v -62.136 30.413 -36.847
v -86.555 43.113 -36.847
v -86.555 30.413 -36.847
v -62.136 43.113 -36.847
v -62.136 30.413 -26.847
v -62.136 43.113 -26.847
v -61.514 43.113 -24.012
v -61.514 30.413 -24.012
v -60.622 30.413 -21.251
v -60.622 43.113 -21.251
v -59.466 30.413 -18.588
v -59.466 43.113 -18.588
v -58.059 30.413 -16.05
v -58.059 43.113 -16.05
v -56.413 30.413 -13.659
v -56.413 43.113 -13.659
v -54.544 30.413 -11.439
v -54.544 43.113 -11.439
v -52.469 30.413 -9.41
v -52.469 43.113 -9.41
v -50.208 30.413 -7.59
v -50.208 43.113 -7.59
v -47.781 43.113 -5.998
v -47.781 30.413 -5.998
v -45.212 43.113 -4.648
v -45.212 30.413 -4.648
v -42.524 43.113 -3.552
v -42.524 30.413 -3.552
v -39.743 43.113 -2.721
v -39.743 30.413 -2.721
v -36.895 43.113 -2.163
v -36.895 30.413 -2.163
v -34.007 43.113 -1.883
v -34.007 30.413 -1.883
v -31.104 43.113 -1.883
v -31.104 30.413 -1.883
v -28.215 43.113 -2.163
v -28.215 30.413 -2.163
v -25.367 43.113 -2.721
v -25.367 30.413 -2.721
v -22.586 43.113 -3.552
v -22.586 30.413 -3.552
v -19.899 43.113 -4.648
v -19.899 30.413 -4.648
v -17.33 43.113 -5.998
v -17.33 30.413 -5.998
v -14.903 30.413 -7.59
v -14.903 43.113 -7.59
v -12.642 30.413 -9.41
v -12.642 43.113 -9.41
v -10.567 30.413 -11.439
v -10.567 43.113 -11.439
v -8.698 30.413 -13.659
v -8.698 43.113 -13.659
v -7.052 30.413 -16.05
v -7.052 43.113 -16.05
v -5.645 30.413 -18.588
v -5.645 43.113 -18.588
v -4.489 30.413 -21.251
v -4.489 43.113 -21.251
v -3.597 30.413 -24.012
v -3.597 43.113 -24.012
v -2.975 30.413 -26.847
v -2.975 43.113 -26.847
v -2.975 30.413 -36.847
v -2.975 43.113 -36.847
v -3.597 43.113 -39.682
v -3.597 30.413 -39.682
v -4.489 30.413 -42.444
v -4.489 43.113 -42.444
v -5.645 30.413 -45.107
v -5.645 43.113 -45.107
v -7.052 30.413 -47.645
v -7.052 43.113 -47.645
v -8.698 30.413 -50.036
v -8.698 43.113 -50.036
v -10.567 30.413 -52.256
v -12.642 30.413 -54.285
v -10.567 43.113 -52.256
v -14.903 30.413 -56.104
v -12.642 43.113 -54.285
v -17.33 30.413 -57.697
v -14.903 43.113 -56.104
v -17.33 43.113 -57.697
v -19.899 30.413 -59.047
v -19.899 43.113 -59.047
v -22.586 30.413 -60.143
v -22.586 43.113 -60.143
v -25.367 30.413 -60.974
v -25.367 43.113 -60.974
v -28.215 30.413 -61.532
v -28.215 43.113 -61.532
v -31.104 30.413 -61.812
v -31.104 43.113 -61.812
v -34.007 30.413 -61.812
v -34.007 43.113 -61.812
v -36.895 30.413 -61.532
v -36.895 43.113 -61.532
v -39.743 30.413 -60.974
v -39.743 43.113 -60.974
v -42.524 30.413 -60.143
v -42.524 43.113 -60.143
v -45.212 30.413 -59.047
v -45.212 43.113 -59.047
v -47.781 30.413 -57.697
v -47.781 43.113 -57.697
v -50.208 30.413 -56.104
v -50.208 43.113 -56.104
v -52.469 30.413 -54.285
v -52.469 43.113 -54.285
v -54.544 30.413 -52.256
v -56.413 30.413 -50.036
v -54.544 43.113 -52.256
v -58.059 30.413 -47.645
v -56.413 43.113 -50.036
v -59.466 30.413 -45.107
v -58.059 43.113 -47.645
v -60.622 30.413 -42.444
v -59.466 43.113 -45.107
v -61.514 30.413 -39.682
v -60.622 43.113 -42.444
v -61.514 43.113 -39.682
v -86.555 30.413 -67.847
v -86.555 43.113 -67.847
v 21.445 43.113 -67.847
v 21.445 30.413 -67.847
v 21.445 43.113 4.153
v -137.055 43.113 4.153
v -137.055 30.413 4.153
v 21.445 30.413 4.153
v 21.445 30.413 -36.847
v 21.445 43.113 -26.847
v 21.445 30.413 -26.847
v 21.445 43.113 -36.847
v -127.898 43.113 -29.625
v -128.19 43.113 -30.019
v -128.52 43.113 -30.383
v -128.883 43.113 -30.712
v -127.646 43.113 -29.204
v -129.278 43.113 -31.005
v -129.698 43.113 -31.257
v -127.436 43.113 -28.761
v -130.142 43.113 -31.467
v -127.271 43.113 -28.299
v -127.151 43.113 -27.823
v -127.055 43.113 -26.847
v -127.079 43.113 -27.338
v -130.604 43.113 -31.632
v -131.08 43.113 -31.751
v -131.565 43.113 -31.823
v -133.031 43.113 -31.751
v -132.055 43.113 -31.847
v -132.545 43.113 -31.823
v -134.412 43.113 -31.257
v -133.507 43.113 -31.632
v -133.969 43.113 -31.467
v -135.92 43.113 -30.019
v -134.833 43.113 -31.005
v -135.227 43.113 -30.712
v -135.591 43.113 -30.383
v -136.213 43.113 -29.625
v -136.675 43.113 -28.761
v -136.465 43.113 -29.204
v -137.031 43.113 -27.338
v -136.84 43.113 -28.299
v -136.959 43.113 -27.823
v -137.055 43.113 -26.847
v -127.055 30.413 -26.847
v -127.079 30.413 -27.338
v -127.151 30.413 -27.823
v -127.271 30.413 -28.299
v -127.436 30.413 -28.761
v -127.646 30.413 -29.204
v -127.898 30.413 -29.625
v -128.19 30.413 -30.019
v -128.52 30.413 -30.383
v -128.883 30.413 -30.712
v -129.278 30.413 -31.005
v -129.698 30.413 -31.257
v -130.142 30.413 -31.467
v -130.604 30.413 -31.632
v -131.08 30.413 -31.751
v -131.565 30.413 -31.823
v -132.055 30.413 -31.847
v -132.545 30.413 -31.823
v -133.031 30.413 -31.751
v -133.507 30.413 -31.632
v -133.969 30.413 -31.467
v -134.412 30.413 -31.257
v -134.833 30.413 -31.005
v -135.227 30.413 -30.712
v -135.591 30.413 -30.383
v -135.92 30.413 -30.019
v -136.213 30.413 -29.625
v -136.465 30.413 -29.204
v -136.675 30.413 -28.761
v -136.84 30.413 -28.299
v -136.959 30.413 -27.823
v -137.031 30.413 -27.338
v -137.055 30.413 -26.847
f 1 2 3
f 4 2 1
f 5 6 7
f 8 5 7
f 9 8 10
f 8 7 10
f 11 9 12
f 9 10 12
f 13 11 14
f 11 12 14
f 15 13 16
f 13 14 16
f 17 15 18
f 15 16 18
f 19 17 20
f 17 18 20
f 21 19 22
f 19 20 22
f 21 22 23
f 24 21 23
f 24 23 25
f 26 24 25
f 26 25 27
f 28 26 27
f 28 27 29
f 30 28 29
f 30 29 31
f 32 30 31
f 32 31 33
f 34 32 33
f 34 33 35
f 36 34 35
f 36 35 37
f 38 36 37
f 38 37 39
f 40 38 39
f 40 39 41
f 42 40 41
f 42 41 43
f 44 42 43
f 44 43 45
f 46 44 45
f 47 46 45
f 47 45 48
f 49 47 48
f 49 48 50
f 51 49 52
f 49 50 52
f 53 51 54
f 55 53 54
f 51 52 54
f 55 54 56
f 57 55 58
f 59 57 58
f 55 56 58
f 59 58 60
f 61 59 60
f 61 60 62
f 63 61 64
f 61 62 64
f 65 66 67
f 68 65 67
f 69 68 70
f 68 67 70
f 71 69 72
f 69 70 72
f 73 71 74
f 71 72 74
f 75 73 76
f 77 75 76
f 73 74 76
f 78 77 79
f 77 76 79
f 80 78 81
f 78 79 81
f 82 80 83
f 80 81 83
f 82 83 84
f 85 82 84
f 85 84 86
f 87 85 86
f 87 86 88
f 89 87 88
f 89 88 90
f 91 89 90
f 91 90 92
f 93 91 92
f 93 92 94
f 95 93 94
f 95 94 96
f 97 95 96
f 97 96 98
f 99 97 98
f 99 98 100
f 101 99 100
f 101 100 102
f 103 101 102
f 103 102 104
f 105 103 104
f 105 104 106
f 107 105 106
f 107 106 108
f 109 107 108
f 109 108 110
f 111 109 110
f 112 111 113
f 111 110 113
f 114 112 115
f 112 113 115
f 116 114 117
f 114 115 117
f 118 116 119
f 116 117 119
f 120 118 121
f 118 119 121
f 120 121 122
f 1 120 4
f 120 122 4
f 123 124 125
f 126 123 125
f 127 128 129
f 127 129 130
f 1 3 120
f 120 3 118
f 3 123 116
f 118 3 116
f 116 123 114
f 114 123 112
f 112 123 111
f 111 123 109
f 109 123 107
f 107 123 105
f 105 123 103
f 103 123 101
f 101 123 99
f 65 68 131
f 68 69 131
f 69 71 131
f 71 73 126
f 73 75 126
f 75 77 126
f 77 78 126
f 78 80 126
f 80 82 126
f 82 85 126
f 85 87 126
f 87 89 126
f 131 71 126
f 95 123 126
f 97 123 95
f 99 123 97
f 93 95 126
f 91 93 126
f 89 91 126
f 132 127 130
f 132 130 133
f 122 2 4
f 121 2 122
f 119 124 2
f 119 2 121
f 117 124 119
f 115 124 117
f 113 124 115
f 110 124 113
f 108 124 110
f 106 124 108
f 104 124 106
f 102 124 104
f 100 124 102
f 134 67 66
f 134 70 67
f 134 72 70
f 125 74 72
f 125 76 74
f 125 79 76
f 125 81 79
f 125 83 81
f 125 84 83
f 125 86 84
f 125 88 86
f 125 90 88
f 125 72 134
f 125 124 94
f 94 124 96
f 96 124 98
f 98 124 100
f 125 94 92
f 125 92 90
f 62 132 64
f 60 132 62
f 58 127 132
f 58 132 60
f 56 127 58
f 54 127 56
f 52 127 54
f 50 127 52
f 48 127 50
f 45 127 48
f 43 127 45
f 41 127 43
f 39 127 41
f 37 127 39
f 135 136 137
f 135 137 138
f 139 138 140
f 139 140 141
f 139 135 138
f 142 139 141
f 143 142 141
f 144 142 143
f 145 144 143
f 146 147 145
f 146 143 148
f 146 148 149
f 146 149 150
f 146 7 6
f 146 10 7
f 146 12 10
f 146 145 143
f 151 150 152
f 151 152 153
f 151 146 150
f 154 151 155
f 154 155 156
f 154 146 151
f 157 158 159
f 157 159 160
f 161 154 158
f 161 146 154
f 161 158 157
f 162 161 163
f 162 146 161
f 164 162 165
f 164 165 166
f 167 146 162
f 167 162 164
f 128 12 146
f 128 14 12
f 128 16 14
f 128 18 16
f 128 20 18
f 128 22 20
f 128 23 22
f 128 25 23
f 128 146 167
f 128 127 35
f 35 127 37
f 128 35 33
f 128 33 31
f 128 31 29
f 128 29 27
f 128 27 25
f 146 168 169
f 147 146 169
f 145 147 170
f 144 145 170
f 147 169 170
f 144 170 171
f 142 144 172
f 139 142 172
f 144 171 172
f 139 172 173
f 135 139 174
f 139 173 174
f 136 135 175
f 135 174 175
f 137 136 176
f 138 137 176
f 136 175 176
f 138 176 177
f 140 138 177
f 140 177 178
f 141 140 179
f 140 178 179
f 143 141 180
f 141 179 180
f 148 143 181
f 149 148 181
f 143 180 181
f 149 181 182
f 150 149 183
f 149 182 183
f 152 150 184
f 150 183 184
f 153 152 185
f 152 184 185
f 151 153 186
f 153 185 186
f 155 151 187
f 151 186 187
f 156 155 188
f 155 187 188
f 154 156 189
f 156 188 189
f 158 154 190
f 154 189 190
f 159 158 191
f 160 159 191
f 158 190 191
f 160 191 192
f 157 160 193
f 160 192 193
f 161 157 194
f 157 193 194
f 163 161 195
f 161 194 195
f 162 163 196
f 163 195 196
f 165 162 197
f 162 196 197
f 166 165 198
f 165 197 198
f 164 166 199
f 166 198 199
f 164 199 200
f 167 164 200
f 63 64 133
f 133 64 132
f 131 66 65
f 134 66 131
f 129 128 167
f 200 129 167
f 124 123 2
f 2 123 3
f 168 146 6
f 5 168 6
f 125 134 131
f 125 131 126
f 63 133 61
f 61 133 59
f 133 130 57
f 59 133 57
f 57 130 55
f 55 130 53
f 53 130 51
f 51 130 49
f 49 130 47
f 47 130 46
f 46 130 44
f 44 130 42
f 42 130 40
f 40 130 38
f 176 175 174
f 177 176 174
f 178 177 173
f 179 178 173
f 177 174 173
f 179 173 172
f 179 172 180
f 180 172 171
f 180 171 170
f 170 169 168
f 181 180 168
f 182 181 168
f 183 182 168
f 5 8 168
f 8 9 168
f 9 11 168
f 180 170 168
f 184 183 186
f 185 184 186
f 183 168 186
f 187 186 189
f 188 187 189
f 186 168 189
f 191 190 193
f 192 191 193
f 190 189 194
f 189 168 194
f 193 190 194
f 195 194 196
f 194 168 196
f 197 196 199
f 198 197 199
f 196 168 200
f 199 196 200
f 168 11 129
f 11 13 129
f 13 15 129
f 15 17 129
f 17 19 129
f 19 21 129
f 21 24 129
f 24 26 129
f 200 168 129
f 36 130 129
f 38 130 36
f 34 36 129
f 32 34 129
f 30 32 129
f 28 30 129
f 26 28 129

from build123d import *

# Parameters (mm, degrees)
SKETCH1_W           = 158.5
SKETCH1_H           = 72
BOSS_EXTRUDE1_DEPTH = 12.7
SKETCH2_R           = 30
CUT_EXTRUDE1_DEPTH  = 13.7
SKETCH3_W           = 158.5
SKETCH3_H           = 10
CUT_EXTRUDE3_DEPTH  = 13.7
SKETCH4_W           = 50.5
SKETCH4_H           = 31
CUT_EXTRUDE4_DEPTH  = 13.7
BOSS_EXTRUDE2_DEPTH = 12.7


with BuildPart() as part:
    # Sketch1 → Boss-Extrude1 (new body)
    with BuildSketch(Plane(origin=(0, 43.113273326, 0), x_dir=(1, 0, 0), z_dir=(0, 1, 0))):
        with Locations((-57.805385746, 31.84742784)):
            Rectangle(SKETCH1_W, SKETCH1_H)
    extrude(amount=-BOSS_EXTRUDE1_DEPTH)

    # Sketch2 → Cut-Extrude1 (cut, through all)
    with BuildSketch(Plane(origin=(0, 43.113273326, 0), x_dir=(1, 0, 0), z_dir=(0, 1, 0))):
        with Locations((-32.555385746, 31.84742784)):
            Circle(SKETCH2_R)
    extrude(amount=-CUT_EXTRUDE1_DEPTH, mode=Mode.SUBTRACT)

    # Sketch3 → Cut-Extrude3 (cut, through all)
    with BuildSketch(Plane(origin=(0, 43.113273326, 0), x_dir=(1, 0, 0), z_dir=(0, 1, 0))):
        with Locations((-57.805385746, 31.84742784)):
            Rectangle(SKETCH3_W, SKETCH3_H)
    extrude(amount=-CUT_EXTRUDE3_DEPTH, mode=Mode.SUBTRACT)

    # Sketch4 → Cut-Extrude4 (cut, through all)
    with BuildSketch(Plane.XZ.offset(-30.413273326)):
        with Locations((-111.805385746, -52.34742784)):
            Rectangle(SKETCH4_W, SKETCH4_H)
    extrude(amount=-CUT_EXTRUDE4_DEPTH, mode=Mode.SUBTRACT)

    # Sketch5 → Boss-Extrude2 (add)
    with BuildSketch(Plane.XZ.offset(-30.413273326)):
        with BuildLine():
            Line((-137.055385746, -26.84742784), (-127.055385746, -26.84742784))
            ThreePointArc((-127.055385746, -26.84742784), (-132.055385746, -31.84742784), (-137.055385746, -26.84742784))
        make_face()
    extrude(amount=-BOSS_EXTRUDE2_DEPTH)


solid = part.part
